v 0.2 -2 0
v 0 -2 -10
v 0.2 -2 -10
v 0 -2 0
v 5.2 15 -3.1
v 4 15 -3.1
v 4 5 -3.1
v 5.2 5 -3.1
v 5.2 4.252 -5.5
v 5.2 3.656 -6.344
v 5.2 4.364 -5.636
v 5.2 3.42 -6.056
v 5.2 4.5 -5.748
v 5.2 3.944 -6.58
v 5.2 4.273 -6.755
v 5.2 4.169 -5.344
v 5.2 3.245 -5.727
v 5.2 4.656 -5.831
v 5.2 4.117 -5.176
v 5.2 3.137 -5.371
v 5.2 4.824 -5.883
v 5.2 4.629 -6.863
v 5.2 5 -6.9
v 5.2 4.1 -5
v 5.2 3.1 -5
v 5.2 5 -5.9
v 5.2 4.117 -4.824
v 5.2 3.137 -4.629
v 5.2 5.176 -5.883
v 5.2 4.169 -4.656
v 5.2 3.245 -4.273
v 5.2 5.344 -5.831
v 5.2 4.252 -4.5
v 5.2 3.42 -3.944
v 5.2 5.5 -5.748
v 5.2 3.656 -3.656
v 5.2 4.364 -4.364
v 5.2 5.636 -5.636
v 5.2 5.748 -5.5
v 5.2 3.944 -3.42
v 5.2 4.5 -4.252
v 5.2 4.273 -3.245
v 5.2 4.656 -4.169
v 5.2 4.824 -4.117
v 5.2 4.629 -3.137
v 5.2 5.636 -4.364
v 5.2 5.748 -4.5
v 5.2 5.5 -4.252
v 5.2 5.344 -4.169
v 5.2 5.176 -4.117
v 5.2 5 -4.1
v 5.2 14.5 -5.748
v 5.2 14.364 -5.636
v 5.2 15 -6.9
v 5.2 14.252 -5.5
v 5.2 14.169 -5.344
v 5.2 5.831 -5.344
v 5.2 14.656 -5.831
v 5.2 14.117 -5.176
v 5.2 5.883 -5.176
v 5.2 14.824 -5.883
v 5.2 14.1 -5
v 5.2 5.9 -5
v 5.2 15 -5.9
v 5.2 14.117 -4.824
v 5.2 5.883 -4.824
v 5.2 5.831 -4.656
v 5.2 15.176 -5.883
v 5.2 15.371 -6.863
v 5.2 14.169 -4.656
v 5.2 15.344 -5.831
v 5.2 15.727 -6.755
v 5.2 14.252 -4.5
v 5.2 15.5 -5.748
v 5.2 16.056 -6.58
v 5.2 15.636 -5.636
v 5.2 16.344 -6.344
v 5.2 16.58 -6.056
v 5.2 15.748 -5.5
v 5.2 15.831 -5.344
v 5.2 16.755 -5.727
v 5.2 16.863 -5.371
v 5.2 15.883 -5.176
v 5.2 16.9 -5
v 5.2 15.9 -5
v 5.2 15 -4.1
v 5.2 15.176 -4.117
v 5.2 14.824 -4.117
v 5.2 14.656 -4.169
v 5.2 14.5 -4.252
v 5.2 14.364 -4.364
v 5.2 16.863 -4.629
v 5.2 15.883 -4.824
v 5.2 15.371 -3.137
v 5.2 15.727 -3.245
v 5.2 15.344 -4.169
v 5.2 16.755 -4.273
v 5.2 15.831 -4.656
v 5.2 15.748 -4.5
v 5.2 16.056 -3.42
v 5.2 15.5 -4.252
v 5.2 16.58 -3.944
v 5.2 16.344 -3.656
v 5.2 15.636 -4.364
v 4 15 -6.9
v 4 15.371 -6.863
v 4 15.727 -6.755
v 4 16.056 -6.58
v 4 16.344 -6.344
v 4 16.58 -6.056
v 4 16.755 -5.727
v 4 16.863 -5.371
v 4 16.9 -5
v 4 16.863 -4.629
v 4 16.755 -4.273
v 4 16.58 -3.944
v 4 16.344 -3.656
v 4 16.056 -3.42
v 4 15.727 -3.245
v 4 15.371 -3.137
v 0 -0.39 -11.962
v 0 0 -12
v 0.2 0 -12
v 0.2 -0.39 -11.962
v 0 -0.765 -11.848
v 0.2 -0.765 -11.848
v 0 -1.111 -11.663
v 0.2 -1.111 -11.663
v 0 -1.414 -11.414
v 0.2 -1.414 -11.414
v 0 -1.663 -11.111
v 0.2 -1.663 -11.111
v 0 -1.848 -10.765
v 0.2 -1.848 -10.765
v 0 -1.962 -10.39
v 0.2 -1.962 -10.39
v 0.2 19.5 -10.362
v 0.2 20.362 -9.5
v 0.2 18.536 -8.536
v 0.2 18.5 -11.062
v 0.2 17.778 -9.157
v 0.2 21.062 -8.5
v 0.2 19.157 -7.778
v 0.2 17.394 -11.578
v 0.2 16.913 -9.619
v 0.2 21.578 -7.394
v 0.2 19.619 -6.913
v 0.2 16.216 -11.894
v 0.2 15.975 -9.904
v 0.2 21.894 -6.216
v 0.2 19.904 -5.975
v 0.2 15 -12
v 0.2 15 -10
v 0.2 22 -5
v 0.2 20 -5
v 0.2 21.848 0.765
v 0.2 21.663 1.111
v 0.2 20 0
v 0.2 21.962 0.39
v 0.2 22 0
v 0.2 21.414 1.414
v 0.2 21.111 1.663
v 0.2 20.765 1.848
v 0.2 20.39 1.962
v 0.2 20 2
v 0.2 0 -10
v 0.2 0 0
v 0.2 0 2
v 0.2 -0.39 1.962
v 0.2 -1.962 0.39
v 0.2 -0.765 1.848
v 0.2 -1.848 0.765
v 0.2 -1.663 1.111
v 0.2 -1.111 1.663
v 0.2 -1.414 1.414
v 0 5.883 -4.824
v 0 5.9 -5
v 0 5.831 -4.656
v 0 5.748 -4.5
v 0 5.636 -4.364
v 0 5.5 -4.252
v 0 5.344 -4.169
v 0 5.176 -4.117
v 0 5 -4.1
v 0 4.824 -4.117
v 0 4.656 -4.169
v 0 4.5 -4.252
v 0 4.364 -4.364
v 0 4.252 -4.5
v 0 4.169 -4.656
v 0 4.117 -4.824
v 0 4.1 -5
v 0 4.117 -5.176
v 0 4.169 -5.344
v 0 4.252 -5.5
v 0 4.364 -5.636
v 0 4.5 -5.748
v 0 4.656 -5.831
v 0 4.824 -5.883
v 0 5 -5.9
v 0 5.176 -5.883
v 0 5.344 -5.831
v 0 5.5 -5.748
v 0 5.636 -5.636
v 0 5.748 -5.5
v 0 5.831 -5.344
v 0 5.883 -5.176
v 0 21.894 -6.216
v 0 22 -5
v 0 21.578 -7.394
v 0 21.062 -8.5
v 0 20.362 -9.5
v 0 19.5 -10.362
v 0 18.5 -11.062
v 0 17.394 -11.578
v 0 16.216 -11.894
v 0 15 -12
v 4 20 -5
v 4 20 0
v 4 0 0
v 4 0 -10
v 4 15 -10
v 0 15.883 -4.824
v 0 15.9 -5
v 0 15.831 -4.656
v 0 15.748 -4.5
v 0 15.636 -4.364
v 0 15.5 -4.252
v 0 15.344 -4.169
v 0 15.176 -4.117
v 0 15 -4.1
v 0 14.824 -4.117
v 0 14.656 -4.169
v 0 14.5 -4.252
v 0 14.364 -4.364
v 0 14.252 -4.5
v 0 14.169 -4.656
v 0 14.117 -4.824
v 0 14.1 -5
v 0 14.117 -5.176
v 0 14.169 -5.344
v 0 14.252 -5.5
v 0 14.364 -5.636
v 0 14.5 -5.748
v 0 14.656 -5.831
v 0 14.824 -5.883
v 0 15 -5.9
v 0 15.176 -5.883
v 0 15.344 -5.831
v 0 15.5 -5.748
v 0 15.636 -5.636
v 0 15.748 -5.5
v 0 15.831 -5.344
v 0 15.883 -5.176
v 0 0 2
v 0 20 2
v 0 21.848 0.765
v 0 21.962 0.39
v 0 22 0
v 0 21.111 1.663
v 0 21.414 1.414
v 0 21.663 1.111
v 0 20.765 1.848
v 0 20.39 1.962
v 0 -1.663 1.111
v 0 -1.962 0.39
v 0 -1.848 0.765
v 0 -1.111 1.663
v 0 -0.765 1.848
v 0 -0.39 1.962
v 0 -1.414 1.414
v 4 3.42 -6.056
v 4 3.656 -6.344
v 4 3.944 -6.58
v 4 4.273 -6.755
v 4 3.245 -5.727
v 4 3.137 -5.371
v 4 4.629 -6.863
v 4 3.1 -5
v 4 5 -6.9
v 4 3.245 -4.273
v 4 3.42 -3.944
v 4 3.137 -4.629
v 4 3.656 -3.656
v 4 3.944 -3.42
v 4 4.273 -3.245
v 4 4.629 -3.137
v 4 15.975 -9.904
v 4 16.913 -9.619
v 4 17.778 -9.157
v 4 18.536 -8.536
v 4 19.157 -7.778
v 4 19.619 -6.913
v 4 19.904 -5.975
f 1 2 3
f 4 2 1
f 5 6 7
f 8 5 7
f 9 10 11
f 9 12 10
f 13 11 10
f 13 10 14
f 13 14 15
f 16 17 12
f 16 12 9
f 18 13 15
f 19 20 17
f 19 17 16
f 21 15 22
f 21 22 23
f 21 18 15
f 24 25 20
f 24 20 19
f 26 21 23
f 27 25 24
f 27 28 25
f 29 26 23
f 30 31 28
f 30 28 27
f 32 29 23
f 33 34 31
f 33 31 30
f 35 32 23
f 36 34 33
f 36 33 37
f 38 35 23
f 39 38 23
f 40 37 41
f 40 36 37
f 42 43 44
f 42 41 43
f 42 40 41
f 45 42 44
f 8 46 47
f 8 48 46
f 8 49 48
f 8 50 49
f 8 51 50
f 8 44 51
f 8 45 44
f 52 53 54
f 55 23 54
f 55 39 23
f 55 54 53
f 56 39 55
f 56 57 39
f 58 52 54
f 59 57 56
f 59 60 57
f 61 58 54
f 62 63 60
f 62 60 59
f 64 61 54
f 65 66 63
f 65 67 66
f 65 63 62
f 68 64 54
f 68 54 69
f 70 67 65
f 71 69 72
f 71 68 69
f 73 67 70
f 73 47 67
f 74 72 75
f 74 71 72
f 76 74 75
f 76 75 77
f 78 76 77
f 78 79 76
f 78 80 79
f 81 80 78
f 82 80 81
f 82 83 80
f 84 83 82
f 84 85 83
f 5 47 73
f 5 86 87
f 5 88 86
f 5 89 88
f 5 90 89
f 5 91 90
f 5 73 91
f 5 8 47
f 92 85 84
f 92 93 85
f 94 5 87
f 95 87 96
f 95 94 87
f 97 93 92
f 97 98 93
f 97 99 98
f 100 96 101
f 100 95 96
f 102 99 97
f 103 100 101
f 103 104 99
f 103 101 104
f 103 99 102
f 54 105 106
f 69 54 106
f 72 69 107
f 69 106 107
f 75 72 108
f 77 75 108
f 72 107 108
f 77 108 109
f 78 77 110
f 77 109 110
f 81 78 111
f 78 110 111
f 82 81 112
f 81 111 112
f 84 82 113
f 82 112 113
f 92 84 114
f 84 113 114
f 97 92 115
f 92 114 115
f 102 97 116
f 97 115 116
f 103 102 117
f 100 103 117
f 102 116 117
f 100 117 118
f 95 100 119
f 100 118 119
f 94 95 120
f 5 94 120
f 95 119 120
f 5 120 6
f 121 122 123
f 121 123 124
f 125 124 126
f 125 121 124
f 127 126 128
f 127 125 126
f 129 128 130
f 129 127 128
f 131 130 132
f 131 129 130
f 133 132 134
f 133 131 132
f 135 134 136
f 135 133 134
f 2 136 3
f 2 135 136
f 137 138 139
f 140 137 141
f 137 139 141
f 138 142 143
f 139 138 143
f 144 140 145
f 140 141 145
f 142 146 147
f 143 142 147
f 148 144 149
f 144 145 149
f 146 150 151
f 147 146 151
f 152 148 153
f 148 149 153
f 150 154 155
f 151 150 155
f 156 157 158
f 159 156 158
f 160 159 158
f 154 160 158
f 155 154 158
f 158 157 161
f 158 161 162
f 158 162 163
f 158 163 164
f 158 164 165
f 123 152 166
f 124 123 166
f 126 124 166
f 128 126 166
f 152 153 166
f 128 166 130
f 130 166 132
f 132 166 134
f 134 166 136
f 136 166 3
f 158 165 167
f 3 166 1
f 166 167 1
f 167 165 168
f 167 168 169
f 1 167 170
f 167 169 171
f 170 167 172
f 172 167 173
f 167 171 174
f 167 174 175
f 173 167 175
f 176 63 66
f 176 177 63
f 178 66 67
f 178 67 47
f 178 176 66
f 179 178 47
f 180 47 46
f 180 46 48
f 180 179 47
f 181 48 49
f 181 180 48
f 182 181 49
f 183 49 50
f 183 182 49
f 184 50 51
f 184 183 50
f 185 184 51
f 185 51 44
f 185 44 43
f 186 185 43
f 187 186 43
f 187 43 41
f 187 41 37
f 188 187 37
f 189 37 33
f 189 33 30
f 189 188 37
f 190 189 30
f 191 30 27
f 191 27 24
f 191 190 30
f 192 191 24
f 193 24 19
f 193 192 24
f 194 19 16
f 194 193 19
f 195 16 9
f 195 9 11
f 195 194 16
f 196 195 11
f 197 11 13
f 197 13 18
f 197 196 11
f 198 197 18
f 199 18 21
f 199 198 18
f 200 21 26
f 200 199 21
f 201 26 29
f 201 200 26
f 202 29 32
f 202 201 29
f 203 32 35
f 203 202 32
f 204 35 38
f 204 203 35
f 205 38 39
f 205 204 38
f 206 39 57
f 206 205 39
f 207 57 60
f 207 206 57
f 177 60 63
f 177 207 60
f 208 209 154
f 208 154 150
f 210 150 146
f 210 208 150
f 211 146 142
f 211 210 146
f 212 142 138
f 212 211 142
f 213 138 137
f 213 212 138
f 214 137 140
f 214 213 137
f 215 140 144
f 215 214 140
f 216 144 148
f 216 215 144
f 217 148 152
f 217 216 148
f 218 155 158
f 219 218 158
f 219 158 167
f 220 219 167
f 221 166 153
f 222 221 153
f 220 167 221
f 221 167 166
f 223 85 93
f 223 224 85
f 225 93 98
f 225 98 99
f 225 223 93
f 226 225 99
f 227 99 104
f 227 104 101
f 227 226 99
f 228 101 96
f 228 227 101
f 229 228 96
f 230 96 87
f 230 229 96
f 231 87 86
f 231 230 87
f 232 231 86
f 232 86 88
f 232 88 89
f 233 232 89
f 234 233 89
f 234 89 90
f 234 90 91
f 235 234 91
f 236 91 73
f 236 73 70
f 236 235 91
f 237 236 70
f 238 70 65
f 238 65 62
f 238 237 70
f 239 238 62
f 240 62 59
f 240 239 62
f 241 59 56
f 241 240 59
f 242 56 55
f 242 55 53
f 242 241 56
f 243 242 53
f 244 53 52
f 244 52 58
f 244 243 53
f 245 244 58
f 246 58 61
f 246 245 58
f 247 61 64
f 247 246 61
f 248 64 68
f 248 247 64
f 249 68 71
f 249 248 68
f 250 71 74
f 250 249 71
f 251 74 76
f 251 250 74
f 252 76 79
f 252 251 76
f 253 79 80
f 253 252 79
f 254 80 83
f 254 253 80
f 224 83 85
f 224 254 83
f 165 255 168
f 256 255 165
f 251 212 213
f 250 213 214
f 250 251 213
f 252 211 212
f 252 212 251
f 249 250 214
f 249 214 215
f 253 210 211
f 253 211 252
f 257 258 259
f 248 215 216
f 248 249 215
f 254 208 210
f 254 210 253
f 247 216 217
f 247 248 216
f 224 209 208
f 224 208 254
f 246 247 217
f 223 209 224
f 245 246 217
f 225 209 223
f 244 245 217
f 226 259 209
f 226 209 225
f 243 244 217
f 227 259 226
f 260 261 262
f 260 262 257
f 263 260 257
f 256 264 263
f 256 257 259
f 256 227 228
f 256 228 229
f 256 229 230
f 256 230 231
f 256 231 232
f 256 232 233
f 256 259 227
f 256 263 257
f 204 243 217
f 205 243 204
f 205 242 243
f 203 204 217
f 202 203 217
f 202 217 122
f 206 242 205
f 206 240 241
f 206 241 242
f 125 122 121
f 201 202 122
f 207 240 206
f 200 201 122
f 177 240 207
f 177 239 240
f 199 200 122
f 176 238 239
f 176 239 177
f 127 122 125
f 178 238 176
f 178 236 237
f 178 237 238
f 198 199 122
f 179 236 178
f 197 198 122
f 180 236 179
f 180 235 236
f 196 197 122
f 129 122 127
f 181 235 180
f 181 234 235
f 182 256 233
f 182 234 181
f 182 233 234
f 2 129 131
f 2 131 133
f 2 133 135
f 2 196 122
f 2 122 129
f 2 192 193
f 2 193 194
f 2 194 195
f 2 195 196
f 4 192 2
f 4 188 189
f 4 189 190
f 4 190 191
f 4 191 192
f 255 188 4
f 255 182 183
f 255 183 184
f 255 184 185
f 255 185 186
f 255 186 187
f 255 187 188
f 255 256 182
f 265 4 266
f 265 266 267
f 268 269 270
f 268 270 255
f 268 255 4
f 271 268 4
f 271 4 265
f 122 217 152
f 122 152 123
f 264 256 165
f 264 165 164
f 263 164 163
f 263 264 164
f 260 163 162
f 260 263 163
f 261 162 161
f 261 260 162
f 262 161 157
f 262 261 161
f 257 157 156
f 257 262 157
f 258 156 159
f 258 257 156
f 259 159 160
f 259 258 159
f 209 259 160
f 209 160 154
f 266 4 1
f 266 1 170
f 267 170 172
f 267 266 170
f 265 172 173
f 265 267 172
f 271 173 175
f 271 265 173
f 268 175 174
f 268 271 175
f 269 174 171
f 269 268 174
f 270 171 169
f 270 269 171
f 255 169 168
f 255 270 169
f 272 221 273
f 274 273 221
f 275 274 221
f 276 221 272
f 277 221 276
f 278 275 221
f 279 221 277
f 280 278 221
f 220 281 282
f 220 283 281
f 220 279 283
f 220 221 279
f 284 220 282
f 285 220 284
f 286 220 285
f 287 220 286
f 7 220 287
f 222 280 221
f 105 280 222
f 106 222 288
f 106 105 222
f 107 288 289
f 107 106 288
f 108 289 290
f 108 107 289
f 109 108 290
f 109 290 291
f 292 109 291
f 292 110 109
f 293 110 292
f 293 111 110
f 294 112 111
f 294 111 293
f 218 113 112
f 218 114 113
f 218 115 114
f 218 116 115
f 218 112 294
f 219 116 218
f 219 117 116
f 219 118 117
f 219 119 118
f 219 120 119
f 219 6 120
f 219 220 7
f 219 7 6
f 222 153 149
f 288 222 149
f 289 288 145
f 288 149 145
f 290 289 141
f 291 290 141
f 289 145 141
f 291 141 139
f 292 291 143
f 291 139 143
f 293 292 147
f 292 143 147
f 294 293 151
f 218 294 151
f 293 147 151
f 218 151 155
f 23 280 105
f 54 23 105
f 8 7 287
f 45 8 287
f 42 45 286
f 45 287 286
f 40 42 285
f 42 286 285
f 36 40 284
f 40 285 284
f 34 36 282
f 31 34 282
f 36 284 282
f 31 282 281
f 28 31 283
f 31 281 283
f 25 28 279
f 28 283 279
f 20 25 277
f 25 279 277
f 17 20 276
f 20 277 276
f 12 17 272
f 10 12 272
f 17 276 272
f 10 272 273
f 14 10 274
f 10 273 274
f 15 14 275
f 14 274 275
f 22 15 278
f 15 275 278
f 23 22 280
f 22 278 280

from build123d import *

# Parameters (mm, degrees)
F0_R     = 0.9
F1_DEPTH = 4
F2_R     = 0.9
F3_DEPTH = 1.2
F5_DEPTH = 0.2


with BuildPart() as f1:
    # F0 (on Right) → F1 (new body)
    with BuildSketch(Plane.YZ):
        with BuildLine():
            Line((20, 0), (0, 0))
            Line((0, 0), (0, -10))
            Line((0, -10), (15, -10))
            ThreePointArc((15, -10), (18.535534, -8.535534), (20, -5))
            Line((20, -5), (20, 0))
        make_face()
        with Locations((5, -5)):
            Circle(F0_R, mode=Mode.SUBTRACT)
        with Locations((15, -5)):
            Circle(F0_R, mode=Mode.SUBTRACT)
    extrude(amount=F1_DEPTH)

    # F2 (on face) → F3 (join)
    with BuildSketch(Plane.YZ.offset(4)):
        with BuildLine():
            Line((15, -3.1), (5, -3.1))
            ThreePointArc((5, -3.1), (3.1, -5), (5, -6.9))
            Line((5, -6.9), (15, -6.9))
            ThreePointArc((15, -6.9), (16.9, -5), (15, -3.1))
        make_face()
        with Locations((5, -5)):
            Circle(F2_R, mode=Mode.SUBTRACT)
        with Locations((15, -5)):
            Circle(F2_R, mode=Mode.SUBTRACT)
    extrude(amount=F3_DEPTH)

    # F4 (on face) → F5 (join)
    with BuildSketch(Plane(origin=(0, 0, 0), x_dir=(0, -1, 0), z_dir=(-1, 0, 0))):
        with BuildLine():
            ThreePointArc((-20, 2), (-21.414214, 1.414214), (-22, 0))
            Line((-22, 0), (-22, -5))
            ThreePointArc((-22, -5), (-19.949747, -9.949747), (-15, -12))
            Line((-15, -12), (0, -12))
            ThreePointArc((0, -12), (1.414214, -11.414214), (2, -10))
            Line((2, -10), (2, 0))
            ThreePointArc((2, 0), (1.414214, 1.414214), (0, 2))
            Line((0, 2), (-20, 2))
        make_face()
        with BuildLine():
            Line((-20, -5), (-20, 0))
            Line((-20, 0), (0, 0))
            Line((0, 0), (0, -10))
            Line((0, -10), (-15, -10))
            ThreePointArc((-15, -10), (-18.535534, -8.535534), (-20, -5))
        make_face(mode=Mode.SUBTRACT)
    extrude(amount=-F5_DEPTH)


solid = f1.part
